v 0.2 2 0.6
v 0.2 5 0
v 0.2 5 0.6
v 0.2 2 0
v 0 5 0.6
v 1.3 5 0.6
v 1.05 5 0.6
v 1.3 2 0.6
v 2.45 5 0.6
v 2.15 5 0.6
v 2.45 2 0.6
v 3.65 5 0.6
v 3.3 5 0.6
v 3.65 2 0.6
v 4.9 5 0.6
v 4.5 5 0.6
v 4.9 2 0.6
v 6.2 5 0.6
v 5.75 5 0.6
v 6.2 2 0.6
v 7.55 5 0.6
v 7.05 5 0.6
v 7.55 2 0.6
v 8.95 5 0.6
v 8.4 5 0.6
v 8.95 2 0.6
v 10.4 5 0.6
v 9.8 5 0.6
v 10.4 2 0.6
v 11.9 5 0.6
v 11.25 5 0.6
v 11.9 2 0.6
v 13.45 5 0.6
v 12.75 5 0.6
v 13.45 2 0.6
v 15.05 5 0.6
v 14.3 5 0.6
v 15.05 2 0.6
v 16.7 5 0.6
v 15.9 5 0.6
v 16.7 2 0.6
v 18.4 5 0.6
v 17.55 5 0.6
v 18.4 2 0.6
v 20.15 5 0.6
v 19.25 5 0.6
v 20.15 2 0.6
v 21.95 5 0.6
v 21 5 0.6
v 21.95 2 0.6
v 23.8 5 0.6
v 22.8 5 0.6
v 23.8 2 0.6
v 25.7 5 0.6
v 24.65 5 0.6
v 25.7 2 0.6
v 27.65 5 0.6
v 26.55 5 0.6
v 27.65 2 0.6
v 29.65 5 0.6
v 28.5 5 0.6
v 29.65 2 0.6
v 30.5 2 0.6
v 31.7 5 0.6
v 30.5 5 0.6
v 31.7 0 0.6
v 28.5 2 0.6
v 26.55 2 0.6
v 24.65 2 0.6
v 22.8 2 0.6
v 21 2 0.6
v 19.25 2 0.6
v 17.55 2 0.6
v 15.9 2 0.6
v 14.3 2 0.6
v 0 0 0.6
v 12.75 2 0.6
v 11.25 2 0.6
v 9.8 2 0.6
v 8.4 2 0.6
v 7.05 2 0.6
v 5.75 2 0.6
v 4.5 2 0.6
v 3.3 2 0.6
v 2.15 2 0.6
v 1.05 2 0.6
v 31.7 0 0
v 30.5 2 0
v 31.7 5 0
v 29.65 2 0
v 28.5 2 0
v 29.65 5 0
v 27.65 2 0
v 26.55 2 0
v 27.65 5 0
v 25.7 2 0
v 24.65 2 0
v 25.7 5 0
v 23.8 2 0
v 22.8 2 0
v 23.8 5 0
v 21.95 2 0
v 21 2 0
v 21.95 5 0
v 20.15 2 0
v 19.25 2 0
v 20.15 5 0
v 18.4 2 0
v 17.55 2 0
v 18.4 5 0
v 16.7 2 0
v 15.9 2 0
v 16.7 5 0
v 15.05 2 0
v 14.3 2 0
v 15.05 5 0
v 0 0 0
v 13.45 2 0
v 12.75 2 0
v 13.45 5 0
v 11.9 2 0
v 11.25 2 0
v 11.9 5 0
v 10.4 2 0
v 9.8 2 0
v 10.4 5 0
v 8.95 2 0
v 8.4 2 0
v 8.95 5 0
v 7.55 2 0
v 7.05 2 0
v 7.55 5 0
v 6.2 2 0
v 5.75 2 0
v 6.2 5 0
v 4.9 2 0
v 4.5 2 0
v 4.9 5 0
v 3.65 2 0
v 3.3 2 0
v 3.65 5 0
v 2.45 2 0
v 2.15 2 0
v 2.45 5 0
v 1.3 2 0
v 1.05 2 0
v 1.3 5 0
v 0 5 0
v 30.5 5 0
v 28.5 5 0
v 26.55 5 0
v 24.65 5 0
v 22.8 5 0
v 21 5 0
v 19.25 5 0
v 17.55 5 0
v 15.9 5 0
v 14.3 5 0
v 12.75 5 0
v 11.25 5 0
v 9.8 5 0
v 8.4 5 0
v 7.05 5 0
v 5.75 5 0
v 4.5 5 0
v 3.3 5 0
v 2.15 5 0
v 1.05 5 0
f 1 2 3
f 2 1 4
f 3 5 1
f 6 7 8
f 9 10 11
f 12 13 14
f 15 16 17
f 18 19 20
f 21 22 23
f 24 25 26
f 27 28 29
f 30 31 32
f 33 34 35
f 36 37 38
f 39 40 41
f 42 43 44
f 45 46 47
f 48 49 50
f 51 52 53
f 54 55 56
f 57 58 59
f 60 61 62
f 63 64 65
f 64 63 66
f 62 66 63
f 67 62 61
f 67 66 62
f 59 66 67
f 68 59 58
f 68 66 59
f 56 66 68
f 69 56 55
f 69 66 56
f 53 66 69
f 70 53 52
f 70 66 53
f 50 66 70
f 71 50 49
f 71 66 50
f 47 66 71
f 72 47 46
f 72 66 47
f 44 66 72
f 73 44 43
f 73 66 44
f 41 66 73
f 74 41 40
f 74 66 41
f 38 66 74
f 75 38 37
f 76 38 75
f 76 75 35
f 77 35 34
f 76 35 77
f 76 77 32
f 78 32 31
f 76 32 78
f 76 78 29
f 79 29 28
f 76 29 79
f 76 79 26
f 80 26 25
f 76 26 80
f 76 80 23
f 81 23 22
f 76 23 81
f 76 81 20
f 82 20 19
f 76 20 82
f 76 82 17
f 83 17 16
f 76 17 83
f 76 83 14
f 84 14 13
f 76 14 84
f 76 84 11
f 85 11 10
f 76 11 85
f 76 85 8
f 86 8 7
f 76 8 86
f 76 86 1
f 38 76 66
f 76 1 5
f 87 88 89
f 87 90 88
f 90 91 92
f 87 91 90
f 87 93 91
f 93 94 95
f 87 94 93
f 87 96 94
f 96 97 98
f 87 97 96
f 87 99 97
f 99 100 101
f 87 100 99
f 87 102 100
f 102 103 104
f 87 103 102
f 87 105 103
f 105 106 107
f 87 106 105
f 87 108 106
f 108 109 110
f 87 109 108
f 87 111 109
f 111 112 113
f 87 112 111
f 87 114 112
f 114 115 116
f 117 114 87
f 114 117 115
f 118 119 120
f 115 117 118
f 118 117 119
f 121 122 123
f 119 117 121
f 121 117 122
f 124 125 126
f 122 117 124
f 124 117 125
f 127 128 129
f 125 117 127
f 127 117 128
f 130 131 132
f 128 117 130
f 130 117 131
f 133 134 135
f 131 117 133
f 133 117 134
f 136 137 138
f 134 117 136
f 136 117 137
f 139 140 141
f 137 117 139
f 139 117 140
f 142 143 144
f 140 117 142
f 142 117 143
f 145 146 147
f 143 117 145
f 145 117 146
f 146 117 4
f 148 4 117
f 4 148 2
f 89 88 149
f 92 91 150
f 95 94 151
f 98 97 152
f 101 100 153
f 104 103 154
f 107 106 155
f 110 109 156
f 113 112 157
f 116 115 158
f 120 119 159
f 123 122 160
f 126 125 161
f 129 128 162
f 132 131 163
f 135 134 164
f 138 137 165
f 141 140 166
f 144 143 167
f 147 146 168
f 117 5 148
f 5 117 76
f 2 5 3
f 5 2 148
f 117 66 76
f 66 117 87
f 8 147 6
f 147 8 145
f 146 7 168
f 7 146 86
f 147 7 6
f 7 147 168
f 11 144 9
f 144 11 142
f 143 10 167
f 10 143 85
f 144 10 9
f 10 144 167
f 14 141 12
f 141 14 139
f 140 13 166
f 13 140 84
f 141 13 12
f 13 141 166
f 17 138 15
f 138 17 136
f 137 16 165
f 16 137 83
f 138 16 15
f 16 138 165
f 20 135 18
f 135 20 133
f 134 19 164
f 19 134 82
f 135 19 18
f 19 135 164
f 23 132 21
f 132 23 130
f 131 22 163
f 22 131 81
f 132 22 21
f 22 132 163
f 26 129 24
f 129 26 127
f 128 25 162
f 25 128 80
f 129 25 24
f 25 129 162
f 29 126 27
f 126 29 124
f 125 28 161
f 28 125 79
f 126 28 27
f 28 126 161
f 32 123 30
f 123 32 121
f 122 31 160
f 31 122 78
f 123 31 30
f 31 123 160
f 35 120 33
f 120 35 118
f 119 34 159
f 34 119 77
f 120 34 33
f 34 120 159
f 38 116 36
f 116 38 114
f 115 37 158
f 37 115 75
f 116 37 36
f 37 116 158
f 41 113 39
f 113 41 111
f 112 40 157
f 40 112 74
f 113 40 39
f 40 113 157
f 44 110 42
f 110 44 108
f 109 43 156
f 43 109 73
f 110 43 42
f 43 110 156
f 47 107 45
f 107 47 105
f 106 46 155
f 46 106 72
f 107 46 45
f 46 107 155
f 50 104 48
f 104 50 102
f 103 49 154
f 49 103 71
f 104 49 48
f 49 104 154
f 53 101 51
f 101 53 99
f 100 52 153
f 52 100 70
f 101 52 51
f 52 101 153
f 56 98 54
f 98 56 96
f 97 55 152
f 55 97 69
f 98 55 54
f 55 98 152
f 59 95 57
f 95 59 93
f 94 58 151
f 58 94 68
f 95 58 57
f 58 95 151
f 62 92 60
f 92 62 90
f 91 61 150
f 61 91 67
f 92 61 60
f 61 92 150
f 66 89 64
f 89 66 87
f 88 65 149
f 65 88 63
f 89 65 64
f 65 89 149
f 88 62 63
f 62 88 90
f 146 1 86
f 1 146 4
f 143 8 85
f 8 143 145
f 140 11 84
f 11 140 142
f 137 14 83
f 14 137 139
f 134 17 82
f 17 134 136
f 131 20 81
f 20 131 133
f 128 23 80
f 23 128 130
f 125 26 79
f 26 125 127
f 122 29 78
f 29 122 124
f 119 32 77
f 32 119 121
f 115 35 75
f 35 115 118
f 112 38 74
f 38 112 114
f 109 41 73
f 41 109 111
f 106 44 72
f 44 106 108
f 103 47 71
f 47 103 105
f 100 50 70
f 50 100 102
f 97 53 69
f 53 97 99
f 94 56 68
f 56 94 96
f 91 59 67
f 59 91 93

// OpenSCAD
//make a calibration comb any size you want
//for checking slicer and printer settings
//mark peeters 2-1-2014

/* [calibration comb settings] */
//smallest tooth width (mm)
start_w=0.2;
//largest tooth (mm)(not exact but close)
end_w=1;
//tooth width increments(mm)
step_w=.05;
//space between teeth(mm)
spacing=1;
//tooth length(mm)
comb_l=5;
//tooth height(mm)
comb_h=.6;
//solid comb base height(mm)
base=2;


echo("total mm length of comb is",(end_w/step_w+1)*(end_w/2)+(spacing*end_w/step_w));

//make the base
cube([(end_w/step_w+1)*(end_w/2)+(spacing*end_w/step_w),base,comb_h]);

//make the teeth
for (i = [0:step_w:end_w]) {
//echo("tooth # is now",1+i/step_w);//for debug
//echo("tooth W is now",start_w+i);//for debug
translate([(i/step_w+1)*(i/2)+(spacing*i/step_w),0,0])cube([start_w+i,comb_l,comb_h]);
}

